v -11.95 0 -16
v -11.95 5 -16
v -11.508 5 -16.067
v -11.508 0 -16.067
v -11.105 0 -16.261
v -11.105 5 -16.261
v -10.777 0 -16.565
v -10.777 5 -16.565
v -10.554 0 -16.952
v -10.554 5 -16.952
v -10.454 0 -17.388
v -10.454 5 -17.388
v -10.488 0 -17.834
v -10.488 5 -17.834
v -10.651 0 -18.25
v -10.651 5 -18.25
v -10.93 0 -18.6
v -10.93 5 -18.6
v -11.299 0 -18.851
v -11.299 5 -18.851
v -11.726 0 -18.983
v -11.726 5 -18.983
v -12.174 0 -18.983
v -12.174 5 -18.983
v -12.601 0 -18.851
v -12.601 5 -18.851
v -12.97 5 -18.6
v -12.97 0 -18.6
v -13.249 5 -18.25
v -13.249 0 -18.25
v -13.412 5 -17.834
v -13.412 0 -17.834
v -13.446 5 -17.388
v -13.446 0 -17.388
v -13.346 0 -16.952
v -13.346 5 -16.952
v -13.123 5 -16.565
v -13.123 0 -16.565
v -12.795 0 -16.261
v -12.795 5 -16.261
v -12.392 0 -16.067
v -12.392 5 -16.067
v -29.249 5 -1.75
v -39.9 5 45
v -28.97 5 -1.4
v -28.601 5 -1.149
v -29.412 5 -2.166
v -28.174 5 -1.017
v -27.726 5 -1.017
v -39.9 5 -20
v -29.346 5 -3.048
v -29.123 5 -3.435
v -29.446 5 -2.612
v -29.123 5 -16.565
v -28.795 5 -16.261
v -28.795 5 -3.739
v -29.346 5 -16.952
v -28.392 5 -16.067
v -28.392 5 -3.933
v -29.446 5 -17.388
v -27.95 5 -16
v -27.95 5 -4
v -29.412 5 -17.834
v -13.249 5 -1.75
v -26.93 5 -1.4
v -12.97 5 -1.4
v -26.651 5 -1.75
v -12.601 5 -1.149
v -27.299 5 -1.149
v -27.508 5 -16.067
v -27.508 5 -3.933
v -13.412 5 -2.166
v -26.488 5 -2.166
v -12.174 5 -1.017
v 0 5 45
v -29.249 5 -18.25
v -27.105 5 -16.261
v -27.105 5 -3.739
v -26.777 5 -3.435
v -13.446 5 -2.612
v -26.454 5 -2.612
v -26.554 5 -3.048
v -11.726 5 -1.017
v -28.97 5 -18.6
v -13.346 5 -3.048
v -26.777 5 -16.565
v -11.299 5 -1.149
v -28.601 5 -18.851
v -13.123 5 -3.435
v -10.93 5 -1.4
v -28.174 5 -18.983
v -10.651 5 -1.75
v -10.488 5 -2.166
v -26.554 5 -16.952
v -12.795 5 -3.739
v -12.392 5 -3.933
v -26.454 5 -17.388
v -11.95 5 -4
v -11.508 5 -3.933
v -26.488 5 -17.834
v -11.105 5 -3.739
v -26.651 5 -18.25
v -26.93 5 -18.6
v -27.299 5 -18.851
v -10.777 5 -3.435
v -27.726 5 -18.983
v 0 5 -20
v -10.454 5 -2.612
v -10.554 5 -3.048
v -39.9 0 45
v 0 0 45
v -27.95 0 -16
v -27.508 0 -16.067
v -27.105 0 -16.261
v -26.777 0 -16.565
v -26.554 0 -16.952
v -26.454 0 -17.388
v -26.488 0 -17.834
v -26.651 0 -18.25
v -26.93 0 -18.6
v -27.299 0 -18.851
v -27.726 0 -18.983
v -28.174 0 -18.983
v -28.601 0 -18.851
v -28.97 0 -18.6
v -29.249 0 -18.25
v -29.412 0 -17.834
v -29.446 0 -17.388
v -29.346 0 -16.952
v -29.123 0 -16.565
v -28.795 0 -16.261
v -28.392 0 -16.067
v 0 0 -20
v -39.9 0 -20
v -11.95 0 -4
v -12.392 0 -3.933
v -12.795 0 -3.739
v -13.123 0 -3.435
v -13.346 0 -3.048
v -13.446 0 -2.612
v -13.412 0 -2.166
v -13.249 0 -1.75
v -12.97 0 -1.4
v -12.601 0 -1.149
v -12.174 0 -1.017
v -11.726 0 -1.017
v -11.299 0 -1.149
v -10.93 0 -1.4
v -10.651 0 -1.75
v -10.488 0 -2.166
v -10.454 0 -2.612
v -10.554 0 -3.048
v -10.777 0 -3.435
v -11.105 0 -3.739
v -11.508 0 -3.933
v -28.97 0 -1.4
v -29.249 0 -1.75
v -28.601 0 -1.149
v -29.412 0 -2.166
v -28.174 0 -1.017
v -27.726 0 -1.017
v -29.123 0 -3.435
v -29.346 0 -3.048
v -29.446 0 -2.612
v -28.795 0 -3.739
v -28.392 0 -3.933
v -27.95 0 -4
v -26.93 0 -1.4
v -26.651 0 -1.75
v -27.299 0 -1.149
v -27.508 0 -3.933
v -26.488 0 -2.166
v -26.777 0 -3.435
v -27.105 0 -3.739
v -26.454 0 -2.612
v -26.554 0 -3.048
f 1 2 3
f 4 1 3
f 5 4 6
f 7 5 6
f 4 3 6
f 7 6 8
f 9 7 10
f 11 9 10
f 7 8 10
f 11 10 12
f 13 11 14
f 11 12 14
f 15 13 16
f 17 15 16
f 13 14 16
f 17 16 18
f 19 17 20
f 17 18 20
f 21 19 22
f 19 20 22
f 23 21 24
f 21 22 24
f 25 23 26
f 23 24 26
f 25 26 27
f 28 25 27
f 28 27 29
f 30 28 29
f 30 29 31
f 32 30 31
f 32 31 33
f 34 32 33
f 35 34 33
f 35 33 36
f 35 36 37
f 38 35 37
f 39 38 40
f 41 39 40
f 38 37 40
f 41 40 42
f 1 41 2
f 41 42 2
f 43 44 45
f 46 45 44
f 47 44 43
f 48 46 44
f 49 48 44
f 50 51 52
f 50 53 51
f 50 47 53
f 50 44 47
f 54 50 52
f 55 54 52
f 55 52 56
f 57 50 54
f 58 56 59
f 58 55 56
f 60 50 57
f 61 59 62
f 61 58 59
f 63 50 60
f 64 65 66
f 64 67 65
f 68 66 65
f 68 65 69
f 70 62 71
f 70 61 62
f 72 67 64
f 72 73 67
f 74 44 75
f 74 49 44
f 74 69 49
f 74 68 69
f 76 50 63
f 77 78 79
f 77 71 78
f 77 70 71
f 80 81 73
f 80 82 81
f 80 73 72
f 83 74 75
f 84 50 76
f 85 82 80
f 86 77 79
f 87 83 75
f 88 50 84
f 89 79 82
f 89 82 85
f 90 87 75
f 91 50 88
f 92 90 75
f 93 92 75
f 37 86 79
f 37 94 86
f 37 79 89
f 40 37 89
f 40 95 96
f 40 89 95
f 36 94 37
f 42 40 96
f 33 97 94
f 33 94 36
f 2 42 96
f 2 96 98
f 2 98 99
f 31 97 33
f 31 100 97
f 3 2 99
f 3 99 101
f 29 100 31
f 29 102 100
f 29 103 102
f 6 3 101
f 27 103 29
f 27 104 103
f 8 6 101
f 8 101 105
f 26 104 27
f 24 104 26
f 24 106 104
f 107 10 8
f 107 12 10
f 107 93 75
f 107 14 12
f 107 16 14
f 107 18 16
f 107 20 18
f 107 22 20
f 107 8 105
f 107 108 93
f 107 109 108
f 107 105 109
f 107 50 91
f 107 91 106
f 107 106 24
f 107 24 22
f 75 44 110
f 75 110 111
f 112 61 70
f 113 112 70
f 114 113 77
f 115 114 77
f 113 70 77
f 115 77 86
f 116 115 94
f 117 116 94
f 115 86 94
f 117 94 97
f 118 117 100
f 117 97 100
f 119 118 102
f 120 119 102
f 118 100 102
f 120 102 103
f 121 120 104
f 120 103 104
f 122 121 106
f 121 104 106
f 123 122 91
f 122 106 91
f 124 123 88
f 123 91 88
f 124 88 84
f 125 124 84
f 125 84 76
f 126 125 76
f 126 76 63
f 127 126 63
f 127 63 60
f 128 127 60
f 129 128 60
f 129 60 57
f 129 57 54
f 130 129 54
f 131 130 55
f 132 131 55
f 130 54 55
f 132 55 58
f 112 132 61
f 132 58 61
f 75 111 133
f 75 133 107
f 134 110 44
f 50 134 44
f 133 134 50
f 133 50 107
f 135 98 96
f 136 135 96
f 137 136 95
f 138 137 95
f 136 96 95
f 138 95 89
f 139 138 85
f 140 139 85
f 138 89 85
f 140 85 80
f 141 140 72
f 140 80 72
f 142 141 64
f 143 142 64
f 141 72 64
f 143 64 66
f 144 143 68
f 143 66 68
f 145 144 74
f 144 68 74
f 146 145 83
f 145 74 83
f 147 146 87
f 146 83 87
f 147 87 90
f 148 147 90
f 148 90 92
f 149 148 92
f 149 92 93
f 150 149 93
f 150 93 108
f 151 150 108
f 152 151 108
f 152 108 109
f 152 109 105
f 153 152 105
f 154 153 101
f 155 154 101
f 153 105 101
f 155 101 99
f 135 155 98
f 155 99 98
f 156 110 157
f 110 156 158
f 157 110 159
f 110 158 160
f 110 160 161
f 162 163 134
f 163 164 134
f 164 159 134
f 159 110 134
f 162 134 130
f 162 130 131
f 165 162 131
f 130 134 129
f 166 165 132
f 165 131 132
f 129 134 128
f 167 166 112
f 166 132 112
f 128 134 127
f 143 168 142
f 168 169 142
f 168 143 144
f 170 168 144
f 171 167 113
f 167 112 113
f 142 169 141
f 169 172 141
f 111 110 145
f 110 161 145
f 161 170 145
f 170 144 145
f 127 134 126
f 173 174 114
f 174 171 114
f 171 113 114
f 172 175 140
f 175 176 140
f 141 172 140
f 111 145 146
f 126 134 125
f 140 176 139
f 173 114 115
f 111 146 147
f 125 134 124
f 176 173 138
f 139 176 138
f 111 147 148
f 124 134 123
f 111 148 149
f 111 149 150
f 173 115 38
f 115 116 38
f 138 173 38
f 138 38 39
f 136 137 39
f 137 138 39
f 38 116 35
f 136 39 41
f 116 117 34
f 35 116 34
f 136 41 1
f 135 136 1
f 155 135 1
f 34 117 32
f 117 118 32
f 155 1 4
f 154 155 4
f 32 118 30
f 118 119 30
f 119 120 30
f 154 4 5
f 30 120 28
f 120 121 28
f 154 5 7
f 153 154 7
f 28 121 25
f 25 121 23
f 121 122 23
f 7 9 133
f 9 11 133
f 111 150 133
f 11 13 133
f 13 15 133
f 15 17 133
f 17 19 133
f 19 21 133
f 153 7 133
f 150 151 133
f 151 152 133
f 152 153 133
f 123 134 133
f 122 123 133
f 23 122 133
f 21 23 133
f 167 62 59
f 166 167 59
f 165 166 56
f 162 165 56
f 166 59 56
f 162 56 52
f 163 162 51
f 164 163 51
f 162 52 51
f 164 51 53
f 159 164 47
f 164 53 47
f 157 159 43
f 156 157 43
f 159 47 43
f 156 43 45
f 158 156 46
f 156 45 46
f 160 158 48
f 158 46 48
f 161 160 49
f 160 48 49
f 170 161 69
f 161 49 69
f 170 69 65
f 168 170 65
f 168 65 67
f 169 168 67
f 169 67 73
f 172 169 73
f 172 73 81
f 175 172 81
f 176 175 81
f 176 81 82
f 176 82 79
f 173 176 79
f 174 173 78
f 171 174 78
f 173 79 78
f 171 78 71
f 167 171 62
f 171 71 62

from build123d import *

# Parameters (mm, degrees)
SKETCH_1_W          = 39.9
SKETCH_1_H          = 20
EXTRUDE_1_DEPTH     = 5
SKETCH_2_R          = 1.5
CUT_EXTRUDE_1_DEPTH = 5
SKETCH_4_W          = 39.9
SKETCH_4_H          = 5
EXTRUDE_2_DEPTH     = 45


with BuildPart() as part:
    # 草图1 → 凸台-拉伸1 (new body)
    with BuildSketch(Plane(origin=(0, 0, 0), x_dir=(1, 0, 0), z_dir=(0, 1, 0))):
        with Locations((-19.95, 10)):
            Rectangle(SKETCH_1_W, SKETCH_1_H)
    extrude(amount=EXTRUDE_1_DEPTH)

    # 草图2 → 切除-拉伸1 (cut)
    with BuildSketch(Plane(origin=(0, 5, 0), x_dir=(1, 0, 0), z_dir=(0, 1, 0))):
        with Locations(Location((-27.95, 17.5, 0), (0, 0, 270))):
            Circle(SKETCH_2_R)
        with Locations(Location((-11.95, 17.5, 0), (0, 0, 270))):
            Circle(SKETCH_2_R)
        with Locations(Location((-11.95, 2.5, 0), (0, 0, 90))):
            Circle(SKETCH_2_R)
        with Locations(Location((-27.95, 2.5, 0), (0, 0, 90))):
            Circle(SKETCH_2_R)
    extrude(amount=-CUT_EXTRUDE_1_DEPTH, mode=Mode.SUBTRACT)

    # 草图4 → 凸台-拉伸2 (add)
    with BuildSketch(Plane.XY):
        with Locations((-19.95, 2.5)):
            Rectangle(SKETCH_4_W, SKETCH_4_H)
    extrude(amount=EXTRUDE_2_DEPTH)


solid = part.part
